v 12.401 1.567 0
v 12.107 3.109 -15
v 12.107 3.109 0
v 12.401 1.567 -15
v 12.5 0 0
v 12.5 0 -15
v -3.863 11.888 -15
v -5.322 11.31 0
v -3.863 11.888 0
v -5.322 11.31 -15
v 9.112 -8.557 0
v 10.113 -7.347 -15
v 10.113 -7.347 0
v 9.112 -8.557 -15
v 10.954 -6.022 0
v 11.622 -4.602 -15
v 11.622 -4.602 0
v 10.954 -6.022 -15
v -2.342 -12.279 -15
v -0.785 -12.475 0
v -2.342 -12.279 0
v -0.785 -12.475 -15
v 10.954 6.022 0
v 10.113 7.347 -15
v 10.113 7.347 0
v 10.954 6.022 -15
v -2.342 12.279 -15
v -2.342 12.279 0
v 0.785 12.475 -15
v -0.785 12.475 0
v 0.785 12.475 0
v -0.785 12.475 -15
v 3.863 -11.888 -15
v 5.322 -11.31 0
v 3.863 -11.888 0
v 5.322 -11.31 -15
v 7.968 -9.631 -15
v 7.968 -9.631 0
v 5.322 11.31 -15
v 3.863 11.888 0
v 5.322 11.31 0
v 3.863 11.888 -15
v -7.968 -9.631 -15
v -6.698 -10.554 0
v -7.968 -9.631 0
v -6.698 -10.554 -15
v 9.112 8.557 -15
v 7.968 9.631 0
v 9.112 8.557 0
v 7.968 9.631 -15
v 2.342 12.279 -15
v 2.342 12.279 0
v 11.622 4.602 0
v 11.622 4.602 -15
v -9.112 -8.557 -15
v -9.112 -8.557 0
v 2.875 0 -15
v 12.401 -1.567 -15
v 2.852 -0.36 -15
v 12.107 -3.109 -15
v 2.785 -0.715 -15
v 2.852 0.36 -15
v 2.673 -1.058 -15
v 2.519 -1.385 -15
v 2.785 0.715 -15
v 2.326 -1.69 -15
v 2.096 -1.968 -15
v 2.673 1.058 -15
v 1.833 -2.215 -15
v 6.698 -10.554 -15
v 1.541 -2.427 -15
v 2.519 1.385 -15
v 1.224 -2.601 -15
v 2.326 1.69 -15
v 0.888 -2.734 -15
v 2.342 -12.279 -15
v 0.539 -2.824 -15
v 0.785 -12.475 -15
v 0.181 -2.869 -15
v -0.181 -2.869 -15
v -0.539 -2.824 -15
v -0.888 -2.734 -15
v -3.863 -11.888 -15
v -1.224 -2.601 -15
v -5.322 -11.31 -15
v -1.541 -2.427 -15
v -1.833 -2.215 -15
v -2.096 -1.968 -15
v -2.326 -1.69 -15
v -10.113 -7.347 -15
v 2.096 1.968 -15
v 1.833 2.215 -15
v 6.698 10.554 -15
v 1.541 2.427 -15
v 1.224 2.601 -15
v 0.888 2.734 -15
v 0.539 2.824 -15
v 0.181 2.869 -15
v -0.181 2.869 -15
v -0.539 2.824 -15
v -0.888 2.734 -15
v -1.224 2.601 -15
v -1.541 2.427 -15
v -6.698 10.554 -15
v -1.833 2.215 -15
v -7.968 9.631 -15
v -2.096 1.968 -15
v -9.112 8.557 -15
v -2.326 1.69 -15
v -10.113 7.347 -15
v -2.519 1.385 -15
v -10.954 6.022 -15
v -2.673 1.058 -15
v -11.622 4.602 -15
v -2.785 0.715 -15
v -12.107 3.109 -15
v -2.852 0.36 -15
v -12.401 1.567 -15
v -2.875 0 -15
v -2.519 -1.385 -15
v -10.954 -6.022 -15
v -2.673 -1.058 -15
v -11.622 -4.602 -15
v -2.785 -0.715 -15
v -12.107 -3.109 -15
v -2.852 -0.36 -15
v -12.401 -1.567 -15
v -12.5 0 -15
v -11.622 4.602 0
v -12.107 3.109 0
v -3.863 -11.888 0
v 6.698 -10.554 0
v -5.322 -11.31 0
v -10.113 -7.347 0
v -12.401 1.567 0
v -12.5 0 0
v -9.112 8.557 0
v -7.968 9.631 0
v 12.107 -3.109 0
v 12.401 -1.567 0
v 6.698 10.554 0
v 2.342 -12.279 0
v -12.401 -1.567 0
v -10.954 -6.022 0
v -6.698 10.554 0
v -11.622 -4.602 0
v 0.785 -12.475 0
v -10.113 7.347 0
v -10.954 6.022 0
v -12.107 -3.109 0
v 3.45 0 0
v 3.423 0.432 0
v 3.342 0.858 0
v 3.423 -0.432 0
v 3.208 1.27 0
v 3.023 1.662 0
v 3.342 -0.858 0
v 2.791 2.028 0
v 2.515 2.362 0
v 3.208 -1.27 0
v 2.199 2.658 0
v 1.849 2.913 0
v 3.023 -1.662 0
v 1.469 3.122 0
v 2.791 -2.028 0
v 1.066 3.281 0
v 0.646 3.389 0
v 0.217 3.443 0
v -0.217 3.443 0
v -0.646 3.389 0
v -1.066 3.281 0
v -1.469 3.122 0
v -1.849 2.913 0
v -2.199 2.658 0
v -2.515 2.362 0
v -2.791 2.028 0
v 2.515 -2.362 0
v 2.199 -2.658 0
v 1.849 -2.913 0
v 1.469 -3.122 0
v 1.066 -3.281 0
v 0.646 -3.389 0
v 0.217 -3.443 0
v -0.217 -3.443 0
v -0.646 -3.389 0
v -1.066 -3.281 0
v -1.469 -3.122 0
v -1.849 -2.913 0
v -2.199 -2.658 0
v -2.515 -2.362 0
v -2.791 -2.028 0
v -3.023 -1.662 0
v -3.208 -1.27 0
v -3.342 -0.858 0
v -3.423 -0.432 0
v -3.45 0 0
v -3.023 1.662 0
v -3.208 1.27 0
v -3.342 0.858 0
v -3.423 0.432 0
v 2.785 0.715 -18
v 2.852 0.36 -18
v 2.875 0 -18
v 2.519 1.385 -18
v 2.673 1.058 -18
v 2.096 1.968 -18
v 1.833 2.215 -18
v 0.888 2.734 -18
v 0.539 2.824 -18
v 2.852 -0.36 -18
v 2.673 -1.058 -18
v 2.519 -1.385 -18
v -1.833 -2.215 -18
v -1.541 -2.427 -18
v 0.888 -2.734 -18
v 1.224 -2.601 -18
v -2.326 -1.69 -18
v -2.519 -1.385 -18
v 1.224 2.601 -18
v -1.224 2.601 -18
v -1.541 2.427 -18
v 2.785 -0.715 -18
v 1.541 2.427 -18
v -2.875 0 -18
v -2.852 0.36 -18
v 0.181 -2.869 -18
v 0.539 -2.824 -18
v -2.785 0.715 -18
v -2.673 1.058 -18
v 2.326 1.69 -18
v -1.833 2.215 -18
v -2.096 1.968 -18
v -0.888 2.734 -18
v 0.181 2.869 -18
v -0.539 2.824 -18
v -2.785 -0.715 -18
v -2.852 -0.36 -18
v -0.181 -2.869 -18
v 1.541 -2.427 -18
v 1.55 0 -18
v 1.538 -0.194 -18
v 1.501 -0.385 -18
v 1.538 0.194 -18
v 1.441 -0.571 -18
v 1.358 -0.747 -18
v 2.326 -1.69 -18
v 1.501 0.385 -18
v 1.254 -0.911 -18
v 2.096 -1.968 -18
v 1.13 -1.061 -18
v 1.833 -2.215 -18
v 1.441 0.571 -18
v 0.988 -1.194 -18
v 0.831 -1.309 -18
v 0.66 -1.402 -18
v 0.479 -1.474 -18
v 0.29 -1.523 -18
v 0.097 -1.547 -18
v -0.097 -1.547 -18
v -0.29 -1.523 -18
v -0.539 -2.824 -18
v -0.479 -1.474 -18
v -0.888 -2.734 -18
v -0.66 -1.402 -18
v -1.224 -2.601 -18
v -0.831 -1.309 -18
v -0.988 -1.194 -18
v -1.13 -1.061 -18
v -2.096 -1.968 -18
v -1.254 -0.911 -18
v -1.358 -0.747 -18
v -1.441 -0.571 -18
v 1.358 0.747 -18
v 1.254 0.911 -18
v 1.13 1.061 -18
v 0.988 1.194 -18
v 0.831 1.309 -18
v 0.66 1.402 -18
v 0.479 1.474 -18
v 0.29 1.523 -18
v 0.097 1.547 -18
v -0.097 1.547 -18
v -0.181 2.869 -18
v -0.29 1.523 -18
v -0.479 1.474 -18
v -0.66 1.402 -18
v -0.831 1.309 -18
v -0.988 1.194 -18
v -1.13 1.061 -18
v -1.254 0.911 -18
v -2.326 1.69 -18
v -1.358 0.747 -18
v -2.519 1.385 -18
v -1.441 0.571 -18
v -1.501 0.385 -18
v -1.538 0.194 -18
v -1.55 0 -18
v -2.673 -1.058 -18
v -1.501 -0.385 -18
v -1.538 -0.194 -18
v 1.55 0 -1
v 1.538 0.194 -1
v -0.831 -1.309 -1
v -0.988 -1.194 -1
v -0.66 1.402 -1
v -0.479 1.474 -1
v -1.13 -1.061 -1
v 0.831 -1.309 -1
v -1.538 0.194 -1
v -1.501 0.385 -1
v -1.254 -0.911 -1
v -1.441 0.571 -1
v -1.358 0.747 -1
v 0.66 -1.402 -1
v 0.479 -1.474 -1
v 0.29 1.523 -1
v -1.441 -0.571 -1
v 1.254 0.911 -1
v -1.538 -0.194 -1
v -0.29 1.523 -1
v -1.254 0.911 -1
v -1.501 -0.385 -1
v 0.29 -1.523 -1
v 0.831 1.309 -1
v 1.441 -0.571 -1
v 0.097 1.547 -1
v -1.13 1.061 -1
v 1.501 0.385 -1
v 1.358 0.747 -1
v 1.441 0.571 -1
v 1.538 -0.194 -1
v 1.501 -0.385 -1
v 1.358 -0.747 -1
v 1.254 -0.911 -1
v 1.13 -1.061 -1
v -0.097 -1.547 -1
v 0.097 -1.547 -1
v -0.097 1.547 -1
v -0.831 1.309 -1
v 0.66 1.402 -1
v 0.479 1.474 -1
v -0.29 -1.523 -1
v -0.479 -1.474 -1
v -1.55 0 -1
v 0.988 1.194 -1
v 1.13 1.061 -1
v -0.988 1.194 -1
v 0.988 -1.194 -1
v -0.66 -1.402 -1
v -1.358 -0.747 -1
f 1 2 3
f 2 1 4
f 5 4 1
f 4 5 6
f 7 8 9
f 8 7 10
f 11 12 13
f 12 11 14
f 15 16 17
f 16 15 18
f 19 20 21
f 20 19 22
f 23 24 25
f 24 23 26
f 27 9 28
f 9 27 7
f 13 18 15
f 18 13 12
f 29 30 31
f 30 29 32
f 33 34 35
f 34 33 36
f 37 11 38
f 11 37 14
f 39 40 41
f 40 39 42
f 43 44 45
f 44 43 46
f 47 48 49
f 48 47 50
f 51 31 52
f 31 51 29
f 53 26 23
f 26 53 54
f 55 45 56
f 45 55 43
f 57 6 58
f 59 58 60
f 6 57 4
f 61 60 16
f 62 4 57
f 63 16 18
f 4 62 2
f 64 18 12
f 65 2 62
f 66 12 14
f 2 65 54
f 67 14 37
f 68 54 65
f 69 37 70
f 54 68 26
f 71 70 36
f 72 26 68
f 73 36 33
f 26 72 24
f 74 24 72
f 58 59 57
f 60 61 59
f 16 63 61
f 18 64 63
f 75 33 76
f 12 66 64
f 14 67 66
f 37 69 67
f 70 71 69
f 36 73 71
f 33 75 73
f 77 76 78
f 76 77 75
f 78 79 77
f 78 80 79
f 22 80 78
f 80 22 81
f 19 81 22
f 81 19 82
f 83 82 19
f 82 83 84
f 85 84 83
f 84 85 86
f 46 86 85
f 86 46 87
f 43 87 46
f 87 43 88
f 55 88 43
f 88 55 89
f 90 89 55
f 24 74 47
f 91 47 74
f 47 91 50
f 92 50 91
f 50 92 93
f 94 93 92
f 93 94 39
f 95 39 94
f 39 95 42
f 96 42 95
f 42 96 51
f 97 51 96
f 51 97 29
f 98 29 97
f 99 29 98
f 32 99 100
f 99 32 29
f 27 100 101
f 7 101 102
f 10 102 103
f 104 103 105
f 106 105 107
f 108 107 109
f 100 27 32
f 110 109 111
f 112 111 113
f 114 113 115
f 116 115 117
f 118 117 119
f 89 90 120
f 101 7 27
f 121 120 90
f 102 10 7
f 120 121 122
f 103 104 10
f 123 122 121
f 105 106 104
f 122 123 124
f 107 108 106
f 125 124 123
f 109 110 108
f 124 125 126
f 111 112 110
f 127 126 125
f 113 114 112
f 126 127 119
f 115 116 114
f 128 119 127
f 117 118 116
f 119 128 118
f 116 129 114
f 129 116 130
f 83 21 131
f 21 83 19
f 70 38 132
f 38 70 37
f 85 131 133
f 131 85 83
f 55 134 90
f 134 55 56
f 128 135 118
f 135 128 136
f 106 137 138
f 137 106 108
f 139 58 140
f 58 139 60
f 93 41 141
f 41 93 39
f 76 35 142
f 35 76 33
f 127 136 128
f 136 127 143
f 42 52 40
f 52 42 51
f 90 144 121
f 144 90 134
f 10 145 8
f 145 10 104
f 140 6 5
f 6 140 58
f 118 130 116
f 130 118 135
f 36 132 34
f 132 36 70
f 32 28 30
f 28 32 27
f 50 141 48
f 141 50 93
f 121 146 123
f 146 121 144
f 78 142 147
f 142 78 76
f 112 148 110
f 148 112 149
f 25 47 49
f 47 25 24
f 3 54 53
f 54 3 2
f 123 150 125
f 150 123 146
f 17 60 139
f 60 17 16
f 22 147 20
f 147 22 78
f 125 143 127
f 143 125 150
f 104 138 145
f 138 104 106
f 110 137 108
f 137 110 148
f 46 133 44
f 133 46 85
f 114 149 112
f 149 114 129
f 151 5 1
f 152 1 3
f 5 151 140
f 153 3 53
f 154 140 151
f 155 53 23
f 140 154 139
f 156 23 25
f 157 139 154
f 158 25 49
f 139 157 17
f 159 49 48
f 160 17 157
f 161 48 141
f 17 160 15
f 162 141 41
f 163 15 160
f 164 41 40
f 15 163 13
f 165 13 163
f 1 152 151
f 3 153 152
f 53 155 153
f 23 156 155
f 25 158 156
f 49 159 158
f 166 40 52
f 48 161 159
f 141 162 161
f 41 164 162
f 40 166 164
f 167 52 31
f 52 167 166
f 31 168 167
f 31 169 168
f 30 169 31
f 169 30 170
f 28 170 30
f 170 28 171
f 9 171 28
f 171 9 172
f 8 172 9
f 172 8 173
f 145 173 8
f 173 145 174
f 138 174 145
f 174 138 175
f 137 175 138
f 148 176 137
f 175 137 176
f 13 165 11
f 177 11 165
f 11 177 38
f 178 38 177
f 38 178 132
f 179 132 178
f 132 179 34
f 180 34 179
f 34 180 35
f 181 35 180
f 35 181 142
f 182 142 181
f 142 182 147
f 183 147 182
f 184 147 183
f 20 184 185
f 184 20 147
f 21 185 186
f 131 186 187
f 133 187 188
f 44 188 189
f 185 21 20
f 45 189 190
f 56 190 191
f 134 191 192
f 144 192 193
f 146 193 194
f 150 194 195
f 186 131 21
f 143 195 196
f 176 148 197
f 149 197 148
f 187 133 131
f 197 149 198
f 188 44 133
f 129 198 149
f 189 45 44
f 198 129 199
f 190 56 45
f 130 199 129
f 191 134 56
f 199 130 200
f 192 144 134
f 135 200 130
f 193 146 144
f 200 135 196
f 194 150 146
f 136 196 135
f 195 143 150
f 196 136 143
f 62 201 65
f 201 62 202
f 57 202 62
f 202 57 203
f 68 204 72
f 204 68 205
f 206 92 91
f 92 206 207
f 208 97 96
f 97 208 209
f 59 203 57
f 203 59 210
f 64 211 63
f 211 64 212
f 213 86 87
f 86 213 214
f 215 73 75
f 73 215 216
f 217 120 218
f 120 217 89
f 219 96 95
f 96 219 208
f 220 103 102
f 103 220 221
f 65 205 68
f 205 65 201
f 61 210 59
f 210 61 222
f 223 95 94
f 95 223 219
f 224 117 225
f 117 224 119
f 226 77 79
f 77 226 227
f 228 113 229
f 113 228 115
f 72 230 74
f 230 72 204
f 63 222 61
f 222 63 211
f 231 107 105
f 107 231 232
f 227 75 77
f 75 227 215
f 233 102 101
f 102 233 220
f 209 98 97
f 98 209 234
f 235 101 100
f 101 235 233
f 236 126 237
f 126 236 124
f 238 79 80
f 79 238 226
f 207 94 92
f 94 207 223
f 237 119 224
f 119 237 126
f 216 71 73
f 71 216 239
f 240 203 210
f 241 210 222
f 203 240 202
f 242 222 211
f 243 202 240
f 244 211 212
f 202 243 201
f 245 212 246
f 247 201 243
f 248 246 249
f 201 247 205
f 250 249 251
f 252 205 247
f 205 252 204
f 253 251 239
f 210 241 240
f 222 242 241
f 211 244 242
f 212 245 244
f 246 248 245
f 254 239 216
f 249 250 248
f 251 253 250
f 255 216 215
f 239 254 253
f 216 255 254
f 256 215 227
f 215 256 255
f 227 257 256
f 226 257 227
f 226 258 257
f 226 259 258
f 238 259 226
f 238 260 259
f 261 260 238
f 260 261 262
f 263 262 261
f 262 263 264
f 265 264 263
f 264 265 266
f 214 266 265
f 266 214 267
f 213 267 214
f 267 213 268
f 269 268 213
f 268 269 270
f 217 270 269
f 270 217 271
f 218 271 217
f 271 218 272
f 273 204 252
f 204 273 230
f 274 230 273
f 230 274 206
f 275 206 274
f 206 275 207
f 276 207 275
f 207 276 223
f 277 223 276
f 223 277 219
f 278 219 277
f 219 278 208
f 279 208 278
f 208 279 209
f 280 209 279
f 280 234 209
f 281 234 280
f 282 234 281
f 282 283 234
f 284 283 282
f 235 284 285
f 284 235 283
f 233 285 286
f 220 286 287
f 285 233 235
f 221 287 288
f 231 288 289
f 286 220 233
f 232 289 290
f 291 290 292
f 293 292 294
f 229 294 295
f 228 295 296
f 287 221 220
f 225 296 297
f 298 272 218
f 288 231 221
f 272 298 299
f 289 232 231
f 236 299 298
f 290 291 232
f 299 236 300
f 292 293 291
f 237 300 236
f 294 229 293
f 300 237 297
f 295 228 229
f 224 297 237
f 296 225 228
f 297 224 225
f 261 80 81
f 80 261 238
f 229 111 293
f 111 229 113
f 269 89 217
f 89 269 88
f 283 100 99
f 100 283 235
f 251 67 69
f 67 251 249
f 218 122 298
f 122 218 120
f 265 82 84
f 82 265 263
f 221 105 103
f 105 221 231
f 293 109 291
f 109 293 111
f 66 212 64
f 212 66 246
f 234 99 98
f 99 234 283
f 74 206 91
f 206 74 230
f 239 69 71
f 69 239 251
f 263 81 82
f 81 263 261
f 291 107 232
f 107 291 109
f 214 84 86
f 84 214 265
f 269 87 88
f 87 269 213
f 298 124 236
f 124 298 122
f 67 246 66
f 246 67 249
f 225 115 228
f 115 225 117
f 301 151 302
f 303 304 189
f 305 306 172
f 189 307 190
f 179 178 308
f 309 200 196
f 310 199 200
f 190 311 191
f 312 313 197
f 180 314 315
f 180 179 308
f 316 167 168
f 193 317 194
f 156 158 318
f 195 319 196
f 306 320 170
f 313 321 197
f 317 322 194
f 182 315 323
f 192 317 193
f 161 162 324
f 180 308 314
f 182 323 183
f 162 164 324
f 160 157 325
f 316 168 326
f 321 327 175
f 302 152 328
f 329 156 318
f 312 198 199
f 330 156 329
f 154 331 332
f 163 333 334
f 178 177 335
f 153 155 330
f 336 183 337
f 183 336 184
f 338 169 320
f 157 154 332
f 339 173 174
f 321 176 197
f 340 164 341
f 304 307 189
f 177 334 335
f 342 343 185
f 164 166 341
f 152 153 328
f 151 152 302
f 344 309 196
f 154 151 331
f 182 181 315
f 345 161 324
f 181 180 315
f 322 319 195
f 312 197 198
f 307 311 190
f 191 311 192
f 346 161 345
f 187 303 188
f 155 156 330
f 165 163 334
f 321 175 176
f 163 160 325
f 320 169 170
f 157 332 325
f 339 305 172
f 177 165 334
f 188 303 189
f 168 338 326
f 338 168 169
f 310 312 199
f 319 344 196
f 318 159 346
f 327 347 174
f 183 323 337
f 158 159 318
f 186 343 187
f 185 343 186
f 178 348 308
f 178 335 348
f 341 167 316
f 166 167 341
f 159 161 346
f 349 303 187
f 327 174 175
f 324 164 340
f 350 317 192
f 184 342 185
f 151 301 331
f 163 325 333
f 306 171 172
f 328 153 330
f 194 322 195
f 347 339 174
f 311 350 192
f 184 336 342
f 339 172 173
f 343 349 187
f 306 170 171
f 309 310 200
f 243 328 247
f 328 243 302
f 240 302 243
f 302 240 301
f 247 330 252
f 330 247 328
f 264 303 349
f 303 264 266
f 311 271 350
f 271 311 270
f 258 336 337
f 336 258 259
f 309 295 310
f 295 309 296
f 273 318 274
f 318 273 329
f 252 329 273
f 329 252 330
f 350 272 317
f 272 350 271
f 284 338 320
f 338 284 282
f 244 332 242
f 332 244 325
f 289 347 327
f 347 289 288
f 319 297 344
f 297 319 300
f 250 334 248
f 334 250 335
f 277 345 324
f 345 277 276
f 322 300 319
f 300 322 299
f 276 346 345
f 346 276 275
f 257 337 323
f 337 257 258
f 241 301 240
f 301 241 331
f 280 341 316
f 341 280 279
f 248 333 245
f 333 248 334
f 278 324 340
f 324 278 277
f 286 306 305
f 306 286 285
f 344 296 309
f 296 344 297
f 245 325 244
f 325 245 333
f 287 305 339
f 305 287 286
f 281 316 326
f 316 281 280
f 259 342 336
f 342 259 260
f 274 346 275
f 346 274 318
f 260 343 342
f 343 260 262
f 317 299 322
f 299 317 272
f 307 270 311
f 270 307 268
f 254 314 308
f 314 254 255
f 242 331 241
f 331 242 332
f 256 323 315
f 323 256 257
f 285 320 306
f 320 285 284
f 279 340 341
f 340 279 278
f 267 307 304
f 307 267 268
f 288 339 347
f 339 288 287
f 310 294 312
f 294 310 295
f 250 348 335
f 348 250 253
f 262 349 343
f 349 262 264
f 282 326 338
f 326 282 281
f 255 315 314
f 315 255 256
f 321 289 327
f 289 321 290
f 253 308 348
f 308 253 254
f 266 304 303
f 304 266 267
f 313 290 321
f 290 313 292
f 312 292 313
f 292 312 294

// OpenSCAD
$fn = 50;

difference() {
	union() {
		translate(v = [0, 0, -15.0]) {
			cylinder(h = 15, r = 12.5);
		}
		#translate(v = [0, 0, -18.0]) {
			cylinder(h = 18, r = 2.875);
		}
	}
	union() {
		translate(v = [0, 0, 0]) {
			rotate(a = [0, 0, 0]) {
				difference() {
					union() {
						translate(v = [0, 0, -18.0]) {
							cylinder(h = 18, r = 1.25);
						}
						translate(v = [0, 0, -1.0]) {
							cylinder(h = 1.0, r1 = 1.55, r2 = 3.45);
						}
						translate(v = [0, 0, -18.0]) {
							cylinder(h = 18, r = 1.55);
						}
						translate(v = [0, 0, -18.0]) {
							cylinder(h = 18, r = 1.25);
						}
					}
					union();
				}
			}
		}
	}
}
